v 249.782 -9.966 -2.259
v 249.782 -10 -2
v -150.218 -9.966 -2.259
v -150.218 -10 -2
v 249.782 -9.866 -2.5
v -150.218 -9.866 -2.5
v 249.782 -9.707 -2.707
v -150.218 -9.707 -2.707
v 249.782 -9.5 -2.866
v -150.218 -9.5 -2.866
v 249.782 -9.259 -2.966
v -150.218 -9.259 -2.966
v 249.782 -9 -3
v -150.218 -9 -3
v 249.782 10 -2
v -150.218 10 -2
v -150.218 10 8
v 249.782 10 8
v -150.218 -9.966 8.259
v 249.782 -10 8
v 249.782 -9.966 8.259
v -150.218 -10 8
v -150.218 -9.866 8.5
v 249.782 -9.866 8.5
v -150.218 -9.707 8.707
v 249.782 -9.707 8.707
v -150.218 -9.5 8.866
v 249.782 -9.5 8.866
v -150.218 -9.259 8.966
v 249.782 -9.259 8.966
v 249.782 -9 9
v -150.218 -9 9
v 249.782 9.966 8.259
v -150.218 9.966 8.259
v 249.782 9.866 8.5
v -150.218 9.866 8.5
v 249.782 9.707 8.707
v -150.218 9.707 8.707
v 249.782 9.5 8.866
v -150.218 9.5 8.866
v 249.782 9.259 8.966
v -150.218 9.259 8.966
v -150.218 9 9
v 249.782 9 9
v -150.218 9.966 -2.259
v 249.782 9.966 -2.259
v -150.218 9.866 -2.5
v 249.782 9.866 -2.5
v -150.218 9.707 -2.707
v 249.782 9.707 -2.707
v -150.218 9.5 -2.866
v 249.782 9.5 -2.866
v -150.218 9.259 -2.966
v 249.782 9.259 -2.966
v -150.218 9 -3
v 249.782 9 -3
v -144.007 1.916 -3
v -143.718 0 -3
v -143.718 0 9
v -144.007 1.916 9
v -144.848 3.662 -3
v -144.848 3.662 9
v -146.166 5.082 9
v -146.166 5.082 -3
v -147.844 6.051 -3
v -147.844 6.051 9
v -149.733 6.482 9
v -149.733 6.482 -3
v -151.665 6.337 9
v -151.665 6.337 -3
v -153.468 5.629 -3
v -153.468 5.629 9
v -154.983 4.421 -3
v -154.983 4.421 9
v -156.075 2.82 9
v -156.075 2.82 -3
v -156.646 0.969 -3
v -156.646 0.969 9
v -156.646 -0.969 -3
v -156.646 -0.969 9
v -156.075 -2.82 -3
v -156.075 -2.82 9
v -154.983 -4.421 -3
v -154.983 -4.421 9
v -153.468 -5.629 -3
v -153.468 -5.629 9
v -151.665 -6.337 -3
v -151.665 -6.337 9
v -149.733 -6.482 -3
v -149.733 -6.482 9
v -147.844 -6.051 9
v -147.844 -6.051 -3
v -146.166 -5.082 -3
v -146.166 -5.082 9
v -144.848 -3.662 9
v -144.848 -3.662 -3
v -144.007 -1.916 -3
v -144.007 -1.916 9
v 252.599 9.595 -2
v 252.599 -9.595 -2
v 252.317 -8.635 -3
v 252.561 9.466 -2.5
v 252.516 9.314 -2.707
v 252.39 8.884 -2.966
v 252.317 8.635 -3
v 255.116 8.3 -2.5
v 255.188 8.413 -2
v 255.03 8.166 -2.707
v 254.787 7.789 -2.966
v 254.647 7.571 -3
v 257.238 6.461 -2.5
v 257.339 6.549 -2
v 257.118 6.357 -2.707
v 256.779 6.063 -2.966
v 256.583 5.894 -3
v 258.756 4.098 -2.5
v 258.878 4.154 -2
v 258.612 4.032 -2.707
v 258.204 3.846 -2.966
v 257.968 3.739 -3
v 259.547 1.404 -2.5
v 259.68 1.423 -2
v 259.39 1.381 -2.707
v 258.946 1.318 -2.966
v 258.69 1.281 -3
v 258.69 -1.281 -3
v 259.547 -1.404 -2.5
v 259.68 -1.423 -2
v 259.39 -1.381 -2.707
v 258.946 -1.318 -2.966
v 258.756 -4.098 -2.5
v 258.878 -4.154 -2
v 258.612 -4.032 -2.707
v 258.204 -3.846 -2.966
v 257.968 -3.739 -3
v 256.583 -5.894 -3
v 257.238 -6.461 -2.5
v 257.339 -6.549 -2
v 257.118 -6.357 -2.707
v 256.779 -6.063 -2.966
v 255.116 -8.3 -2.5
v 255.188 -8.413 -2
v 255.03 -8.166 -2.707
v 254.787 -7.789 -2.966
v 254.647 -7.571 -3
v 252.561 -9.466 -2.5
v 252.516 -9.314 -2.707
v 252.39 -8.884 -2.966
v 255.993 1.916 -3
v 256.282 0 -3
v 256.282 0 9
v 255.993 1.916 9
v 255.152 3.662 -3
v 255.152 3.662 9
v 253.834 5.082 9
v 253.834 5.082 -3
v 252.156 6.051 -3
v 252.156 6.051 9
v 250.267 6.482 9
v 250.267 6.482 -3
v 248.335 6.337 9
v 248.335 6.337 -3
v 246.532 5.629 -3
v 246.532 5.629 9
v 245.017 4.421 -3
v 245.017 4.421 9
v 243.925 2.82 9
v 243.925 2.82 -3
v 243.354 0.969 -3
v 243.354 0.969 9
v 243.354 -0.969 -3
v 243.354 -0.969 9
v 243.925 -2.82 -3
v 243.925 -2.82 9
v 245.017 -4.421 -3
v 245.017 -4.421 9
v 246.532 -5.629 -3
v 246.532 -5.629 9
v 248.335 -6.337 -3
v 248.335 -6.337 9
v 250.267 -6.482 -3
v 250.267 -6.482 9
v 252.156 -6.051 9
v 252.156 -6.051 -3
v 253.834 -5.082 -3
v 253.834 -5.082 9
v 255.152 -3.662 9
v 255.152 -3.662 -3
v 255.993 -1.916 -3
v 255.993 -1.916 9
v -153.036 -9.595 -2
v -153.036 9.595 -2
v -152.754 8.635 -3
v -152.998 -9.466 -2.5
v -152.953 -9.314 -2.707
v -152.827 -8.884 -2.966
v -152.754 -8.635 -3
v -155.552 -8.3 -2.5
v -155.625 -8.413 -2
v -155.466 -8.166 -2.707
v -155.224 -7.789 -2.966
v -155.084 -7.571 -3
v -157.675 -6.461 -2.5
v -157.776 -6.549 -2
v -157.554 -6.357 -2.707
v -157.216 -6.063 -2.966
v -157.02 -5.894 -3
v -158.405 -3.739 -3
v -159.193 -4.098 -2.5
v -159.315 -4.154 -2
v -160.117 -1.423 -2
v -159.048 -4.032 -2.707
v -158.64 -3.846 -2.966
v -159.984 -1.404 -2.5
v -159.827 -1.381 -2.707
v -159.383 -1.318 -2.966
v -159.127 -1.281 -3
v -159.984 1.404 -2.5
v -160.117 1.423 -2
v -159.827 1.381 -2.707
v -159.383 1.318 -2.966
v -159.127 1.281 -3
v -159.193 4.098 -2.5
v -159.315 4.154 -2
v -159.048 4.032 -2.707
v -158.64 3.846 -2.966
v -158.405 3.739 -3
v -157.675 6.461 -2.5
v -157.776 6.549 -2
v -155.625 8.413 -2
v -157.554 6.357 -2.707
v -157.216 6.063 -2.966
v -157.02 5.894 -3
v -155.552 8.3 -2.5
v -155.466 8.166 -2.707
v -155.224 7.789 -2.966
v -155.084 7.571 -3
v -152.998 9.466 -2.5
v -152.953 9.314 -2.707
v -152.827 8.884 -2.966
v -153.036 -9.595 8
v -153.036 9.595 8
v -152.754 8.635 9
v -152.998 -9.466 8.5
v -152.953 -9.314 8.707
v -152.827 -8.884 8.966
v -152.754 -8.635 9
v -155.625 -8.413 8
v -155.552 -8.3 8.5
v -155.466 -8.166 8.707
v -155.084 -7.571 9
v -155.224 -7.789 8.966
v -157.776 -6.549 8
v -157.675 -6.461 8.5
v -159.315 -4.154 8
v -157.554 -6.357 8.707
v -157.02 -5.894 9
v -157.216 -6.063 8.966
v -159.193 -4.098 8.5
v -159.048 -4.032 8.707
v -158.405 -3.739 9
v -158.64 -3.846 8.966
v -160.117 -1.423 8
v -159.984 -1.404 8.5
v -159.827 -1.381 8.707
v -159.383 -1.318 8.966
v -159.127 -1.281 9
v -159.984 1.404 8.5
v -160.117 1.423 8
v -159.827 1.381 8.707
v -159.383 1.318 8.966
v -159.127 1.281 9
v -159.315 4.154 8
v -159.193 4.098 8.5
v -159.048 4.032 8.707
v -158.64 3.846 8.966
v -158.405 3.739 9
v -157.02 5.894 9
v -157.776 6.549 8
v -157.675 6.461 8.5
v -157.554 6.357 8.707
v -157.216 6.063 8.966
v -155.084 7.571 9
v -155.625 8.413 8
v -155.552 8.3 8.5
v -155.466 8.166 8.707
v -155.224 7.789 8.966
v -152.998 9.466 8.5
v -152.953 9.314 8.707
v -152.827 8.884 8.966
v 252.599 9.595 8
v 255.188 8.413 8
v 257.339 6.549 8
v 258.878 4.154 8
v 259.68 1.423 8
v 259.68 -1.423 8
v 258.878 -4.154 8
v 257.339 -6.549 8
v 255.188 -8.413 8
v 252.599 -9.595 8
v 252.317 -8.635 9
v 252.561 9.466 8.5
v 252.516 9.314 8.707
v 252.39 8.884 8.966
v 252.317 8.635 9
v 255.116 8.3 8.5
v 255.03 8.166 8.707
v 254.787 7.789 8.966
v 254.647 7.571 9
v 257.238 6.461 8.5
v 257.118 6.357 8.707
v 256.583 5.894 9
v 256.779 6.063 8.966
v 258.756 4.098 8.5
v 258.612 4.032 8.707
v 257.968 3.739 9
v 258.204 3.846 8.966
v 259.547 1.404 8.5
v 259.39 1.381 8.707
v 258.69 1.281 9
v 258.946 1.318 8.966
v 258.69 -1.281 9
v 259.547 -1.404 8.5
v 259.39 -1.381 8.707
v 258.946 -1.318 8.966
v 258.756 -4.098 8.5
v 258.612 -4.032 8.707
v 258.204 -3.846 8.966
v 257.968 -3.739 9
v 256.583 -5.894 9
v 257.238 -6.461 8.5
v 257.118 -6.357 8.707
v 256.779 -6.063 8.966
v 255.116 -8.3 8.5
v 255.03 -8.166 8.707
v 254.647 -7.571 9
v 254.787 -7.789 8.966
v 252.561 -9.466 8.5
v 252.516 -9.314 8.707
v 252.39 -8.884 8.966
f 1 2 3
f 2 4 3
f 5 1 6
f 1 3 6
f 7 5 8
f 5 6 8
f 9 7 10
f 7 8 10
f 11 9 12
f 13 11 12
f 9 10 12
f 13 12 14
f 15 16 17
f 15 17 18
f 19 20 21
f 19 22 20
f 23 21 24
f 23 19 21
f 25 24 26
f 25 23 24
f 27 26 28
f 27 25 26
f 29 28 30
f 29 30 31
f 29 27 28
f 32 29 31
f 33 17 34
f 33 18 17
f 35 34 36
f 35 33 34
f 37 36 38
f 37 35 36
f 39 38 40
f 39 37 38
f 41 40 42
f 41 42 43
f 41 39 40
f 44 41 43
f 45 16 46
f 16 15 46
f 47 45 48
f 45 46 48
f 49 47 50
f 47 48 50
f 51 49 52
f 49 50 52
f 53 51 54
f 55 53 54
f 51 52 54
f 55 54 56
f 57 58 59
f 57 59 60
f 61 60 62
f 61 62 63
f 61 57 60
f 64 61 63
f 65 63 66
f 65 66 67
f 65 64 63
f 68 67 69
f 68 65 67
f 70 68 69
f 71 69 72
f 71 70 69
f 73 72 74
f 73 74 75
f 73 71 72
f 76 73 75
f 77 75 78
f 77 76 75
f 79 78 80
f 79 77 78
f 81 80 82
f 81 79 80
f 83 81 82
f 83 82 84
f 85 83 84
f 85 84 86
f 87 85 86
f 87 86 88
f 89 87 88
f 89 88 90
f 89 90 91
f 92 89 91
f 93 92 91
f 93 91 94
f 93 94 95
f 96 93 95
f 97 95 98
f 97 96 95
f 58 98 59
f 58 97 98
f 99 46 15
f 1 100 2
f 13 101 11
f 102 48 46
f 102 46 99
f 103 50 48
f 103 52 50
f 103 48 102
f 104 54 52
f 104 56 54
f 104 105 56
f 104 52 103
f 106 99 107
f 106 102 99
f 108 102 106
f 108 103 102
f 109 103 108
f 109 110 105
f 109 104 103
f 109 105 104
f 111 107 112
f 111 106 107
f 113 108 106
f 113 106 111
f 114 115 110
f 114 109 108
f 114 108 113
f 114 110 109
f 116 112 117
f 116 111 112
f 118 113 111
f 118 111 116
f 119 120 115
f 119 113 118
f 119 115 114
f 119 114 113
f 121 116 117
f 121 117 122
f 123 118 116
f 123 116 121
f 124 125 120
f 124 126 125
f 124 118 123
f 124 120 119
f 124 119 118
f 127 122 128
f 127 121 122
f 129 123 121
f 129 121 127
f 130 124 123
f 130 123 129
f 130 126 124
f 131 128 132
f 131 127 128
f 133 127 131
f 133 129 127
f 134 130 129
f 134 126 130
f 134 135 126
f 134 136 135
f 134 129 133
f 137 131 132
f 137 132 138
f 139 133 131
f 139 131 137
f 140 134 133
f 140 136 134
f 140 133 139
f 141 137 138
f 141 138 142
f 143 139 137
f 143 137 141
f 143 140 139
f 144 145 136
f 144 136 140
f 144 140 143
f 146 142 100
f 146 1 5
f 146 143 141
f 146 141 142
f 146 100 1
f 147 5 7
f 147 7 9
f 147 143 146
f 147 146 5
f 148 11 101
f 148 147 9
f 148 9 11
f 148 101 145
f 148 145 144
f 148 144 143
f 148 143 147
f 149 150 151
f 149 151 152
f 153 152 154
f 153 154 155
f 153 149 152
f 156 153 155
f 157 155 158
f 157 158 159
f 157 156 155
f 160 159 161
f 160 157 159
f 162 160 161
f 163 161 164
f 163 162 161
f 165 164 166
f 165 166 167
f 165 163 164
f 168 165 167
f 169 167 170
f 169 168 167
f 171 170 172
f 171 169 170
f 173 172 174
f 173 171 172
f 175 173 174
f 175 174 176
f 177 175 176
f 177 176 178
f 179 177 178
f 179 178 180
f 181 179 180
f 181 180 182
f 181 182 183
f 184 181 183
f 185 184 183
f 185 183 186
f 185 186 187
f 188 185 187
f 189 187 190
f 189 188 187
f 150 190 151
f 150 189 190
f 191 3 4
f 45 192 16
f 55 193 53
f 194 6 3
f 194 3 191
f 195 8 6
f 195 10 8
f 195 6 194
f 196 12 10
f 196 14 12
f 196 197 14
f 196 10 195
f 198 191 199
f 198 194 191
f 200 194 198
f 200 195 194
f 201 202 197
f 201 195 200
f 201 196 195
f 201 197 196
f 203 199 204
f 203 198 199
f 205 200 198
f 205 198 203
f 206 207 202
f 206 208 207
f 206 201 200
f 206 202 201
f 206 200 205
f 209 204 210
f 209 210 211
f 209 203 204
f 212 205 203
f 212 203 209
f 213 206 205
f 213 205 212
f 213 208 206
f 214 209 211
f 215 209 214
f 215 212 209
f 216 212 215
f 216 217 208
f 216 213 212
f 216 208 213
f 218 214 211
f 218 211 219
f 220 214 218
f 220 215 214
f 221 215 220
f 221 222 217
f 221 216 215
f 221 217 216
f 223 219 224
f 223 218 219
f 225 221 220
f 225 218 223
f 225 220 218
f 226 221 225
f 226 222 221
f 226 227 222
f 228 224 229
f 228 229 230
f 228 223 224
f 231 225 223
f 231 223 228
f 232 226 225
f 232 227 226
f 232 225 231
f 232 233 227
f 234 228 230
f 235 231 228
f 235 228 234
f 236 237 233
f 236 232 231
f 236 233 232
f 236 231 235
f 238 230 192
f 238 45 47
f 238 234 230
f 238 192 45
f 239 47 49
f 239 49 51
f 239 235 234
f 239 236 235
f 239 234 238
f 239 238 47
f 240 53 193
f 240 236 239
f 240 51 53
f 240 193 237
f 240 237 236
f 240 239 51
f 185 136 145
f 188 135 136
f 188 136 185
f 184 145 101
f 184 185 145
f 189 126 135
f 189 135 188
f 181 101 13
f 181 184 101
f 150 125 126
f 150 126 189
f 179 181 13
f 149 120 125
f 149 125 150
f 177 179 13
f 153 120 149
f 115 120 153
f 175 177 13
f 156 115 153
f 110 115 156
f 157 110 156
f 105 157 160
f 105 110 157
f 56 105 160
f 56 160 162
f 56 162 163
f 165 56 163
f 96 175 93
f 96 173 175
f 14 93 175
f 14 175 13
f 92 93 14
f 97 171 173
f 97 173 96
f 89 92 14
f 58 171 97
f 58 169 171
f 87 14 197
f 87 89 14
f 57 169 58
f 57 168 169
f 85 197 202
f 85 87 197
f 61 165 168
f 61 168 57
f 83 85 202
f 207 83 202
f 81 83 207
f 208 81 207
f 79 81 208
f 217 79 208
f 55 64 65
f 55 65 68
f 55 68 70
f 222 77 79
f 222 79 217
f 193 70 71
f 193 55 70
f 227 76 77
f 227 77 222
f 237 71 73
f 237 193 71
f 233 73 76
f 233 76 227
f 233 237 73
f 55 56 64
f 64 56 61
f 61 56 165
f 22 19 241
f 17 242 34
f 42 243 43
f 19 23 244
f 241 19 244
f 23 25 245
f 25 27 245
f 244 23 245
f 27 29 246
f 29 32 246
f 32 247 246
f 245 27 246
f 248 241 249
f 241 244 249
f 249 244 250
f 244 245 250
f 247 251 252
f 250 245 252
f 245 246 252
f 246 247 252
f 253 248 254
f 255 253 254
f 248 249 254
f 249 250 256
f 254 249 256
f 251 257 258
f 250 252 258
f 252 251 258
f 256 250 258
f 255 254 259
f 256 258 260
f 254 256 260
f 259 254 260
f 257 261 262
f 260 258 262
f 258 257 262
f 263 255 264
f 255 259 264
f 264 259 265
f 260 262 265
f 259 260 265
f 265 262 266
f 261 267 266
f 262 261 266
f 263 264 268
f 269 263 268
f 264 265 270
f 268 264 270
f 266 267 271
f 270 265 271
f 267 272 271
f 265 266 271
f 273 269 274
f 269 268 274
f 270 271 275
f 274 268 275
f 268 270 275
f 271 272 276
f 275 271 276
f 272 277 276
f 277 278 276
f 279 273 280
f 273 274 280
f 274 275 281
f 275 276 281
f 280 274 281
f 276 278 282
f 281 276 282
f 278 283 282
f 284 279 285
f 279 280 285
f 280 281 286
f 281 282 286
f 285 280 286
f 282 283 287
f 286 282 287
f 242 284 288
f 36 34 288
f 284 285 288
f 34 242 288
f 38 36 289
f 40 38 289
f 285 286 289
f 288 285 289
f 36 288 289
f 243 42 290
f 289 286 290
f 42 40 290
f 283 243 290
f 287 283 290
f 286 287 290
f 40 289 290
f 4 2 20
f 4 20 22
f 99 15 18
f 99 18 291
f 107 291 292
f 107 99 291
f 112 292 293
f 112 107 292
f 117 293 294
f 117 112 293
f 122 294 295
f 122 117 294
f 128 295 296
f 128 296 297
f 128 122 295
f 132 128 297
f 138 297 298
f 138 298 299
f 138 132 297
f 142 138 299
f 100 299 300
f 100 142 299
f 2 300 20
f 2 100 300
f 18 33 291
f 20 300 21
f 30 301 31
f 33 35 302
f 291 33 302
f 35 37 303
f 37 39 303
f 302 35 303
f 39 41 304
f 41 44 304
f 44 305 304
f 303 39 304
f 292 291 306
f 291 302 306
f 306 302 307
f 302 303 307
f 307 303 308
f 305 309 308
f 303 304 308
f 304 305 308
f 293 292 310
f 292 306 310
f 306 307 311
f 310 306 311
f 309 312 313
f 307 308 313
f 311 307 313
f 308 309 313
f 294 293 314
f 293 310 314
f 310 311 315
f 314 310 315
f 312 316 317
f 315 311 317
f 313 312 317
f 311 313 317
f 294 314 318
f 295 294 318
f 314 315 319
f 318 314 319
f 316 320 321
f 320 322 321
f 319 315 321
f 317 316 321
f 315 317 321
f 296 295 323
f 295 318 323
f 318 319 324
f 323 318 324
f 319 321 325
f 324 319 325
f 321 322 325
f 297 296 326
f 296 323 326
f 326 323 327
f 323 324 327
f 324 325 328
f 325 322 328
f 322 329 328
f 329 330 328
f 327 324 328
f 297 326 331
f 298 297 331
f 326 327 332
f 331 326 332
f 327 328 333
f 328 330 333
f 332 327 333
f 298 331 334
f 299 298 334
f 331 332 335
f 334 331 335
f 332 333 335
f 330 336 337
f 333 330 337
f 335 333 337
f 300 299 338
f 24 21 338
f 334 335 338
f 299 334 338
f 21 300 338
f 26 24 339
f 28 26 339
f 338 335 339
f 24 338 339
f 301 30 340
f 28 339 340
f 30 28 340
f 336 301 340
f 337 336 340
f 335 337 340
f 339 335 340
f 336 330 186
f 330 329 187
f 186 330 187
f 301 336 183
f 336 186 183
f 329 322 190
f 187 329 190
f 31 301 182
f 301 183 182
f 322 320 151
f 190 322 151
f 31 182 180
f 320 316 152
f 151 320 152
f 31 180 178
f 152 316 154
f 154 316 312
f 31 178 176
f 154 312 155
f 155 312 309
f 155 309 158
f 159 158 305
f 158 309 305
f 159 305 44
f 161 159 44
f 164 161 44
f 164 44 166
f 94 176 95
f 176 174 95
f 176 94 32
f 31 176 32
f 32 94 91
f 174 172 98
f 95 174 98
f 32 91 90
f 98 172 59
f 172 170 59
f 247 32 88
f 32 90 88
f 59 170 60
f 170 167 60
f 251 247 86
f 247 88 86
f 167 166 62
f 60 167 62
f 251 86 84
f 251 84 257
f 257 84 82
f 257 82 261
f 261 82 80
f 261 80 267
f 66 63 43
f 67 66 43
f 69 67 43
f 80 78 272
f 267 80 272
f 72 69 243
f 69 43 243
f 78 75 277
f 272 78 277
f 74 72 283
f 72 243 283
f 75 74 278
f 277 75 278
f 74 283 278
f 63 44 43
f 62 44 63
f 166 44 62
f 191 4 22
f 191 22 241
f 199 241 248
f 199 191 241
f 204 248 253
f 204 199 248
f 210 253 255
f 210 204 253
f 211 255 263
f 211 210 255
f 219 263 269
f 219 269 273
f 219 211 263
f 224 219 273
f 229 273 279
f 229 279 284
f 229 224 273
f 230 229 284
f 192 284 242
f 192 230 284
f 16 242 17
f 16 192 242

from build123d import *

# Parameters (mm, degrees)
SKETCH1_R           = 3.25
BOSS_EXTRUDE1_DEPTH = 6
FILLET1_R           = 0.5
SCALE_1_SCALE       = 2


with BuildPart() as part:
    # Sketch1 → Boss-Extrude1 (new body)
    with BuildSketch(Plane.XY):
        with BuildLine():
            Line((-50.218340611, 5), (149.781659389, 5))
            ThreePointArc((149.781659389, 5), (154.781659389, 0), (149.781659389, -5))
            Line((149.781659389, -5), (-50.218340611, -5))
            ThreePointArc((-50.218340611, -5), (-55.218340611, 0), (-50.218340611, 5))
        make_face()
        with Locations((-50.218340611, 0)):
            Circle(SKETCH1_R, mode=Mode.SUBTRACT)
        with Locations((149.781659389, 0)):
            Circle(SKETCH1_R, mode=Mode.SUBTRACT)
    extrude(amount=BOSS_EXTRUDE1_DEPTH)

    # Fillet1
    fillet1_edges = [part.edges().sort_by_distance(p)[0] for p in [
        (154.781659389, 0, 6),
        (49.781659389, 5, 6),
        (-55.218340611, 0, 6),
        (49.781659389, 5, 0),
        (154.781659389, 0, 0),
        (49.781659389, -5, 0),
        (-55.218340611, 0, 0),
        (49.781659389, -5, 6),
    ]]
    fillet(fillet1_edges, radius=FILLET1_R)


with BuildPart() as part_1:
    # 缩放比例1: scaled about (49.781659389, 0, 3)
    add(part.part.scale(SCALE_1_SCALE).moved(Location((-49.781659389, 0, -3))))


solid = part_1.part
